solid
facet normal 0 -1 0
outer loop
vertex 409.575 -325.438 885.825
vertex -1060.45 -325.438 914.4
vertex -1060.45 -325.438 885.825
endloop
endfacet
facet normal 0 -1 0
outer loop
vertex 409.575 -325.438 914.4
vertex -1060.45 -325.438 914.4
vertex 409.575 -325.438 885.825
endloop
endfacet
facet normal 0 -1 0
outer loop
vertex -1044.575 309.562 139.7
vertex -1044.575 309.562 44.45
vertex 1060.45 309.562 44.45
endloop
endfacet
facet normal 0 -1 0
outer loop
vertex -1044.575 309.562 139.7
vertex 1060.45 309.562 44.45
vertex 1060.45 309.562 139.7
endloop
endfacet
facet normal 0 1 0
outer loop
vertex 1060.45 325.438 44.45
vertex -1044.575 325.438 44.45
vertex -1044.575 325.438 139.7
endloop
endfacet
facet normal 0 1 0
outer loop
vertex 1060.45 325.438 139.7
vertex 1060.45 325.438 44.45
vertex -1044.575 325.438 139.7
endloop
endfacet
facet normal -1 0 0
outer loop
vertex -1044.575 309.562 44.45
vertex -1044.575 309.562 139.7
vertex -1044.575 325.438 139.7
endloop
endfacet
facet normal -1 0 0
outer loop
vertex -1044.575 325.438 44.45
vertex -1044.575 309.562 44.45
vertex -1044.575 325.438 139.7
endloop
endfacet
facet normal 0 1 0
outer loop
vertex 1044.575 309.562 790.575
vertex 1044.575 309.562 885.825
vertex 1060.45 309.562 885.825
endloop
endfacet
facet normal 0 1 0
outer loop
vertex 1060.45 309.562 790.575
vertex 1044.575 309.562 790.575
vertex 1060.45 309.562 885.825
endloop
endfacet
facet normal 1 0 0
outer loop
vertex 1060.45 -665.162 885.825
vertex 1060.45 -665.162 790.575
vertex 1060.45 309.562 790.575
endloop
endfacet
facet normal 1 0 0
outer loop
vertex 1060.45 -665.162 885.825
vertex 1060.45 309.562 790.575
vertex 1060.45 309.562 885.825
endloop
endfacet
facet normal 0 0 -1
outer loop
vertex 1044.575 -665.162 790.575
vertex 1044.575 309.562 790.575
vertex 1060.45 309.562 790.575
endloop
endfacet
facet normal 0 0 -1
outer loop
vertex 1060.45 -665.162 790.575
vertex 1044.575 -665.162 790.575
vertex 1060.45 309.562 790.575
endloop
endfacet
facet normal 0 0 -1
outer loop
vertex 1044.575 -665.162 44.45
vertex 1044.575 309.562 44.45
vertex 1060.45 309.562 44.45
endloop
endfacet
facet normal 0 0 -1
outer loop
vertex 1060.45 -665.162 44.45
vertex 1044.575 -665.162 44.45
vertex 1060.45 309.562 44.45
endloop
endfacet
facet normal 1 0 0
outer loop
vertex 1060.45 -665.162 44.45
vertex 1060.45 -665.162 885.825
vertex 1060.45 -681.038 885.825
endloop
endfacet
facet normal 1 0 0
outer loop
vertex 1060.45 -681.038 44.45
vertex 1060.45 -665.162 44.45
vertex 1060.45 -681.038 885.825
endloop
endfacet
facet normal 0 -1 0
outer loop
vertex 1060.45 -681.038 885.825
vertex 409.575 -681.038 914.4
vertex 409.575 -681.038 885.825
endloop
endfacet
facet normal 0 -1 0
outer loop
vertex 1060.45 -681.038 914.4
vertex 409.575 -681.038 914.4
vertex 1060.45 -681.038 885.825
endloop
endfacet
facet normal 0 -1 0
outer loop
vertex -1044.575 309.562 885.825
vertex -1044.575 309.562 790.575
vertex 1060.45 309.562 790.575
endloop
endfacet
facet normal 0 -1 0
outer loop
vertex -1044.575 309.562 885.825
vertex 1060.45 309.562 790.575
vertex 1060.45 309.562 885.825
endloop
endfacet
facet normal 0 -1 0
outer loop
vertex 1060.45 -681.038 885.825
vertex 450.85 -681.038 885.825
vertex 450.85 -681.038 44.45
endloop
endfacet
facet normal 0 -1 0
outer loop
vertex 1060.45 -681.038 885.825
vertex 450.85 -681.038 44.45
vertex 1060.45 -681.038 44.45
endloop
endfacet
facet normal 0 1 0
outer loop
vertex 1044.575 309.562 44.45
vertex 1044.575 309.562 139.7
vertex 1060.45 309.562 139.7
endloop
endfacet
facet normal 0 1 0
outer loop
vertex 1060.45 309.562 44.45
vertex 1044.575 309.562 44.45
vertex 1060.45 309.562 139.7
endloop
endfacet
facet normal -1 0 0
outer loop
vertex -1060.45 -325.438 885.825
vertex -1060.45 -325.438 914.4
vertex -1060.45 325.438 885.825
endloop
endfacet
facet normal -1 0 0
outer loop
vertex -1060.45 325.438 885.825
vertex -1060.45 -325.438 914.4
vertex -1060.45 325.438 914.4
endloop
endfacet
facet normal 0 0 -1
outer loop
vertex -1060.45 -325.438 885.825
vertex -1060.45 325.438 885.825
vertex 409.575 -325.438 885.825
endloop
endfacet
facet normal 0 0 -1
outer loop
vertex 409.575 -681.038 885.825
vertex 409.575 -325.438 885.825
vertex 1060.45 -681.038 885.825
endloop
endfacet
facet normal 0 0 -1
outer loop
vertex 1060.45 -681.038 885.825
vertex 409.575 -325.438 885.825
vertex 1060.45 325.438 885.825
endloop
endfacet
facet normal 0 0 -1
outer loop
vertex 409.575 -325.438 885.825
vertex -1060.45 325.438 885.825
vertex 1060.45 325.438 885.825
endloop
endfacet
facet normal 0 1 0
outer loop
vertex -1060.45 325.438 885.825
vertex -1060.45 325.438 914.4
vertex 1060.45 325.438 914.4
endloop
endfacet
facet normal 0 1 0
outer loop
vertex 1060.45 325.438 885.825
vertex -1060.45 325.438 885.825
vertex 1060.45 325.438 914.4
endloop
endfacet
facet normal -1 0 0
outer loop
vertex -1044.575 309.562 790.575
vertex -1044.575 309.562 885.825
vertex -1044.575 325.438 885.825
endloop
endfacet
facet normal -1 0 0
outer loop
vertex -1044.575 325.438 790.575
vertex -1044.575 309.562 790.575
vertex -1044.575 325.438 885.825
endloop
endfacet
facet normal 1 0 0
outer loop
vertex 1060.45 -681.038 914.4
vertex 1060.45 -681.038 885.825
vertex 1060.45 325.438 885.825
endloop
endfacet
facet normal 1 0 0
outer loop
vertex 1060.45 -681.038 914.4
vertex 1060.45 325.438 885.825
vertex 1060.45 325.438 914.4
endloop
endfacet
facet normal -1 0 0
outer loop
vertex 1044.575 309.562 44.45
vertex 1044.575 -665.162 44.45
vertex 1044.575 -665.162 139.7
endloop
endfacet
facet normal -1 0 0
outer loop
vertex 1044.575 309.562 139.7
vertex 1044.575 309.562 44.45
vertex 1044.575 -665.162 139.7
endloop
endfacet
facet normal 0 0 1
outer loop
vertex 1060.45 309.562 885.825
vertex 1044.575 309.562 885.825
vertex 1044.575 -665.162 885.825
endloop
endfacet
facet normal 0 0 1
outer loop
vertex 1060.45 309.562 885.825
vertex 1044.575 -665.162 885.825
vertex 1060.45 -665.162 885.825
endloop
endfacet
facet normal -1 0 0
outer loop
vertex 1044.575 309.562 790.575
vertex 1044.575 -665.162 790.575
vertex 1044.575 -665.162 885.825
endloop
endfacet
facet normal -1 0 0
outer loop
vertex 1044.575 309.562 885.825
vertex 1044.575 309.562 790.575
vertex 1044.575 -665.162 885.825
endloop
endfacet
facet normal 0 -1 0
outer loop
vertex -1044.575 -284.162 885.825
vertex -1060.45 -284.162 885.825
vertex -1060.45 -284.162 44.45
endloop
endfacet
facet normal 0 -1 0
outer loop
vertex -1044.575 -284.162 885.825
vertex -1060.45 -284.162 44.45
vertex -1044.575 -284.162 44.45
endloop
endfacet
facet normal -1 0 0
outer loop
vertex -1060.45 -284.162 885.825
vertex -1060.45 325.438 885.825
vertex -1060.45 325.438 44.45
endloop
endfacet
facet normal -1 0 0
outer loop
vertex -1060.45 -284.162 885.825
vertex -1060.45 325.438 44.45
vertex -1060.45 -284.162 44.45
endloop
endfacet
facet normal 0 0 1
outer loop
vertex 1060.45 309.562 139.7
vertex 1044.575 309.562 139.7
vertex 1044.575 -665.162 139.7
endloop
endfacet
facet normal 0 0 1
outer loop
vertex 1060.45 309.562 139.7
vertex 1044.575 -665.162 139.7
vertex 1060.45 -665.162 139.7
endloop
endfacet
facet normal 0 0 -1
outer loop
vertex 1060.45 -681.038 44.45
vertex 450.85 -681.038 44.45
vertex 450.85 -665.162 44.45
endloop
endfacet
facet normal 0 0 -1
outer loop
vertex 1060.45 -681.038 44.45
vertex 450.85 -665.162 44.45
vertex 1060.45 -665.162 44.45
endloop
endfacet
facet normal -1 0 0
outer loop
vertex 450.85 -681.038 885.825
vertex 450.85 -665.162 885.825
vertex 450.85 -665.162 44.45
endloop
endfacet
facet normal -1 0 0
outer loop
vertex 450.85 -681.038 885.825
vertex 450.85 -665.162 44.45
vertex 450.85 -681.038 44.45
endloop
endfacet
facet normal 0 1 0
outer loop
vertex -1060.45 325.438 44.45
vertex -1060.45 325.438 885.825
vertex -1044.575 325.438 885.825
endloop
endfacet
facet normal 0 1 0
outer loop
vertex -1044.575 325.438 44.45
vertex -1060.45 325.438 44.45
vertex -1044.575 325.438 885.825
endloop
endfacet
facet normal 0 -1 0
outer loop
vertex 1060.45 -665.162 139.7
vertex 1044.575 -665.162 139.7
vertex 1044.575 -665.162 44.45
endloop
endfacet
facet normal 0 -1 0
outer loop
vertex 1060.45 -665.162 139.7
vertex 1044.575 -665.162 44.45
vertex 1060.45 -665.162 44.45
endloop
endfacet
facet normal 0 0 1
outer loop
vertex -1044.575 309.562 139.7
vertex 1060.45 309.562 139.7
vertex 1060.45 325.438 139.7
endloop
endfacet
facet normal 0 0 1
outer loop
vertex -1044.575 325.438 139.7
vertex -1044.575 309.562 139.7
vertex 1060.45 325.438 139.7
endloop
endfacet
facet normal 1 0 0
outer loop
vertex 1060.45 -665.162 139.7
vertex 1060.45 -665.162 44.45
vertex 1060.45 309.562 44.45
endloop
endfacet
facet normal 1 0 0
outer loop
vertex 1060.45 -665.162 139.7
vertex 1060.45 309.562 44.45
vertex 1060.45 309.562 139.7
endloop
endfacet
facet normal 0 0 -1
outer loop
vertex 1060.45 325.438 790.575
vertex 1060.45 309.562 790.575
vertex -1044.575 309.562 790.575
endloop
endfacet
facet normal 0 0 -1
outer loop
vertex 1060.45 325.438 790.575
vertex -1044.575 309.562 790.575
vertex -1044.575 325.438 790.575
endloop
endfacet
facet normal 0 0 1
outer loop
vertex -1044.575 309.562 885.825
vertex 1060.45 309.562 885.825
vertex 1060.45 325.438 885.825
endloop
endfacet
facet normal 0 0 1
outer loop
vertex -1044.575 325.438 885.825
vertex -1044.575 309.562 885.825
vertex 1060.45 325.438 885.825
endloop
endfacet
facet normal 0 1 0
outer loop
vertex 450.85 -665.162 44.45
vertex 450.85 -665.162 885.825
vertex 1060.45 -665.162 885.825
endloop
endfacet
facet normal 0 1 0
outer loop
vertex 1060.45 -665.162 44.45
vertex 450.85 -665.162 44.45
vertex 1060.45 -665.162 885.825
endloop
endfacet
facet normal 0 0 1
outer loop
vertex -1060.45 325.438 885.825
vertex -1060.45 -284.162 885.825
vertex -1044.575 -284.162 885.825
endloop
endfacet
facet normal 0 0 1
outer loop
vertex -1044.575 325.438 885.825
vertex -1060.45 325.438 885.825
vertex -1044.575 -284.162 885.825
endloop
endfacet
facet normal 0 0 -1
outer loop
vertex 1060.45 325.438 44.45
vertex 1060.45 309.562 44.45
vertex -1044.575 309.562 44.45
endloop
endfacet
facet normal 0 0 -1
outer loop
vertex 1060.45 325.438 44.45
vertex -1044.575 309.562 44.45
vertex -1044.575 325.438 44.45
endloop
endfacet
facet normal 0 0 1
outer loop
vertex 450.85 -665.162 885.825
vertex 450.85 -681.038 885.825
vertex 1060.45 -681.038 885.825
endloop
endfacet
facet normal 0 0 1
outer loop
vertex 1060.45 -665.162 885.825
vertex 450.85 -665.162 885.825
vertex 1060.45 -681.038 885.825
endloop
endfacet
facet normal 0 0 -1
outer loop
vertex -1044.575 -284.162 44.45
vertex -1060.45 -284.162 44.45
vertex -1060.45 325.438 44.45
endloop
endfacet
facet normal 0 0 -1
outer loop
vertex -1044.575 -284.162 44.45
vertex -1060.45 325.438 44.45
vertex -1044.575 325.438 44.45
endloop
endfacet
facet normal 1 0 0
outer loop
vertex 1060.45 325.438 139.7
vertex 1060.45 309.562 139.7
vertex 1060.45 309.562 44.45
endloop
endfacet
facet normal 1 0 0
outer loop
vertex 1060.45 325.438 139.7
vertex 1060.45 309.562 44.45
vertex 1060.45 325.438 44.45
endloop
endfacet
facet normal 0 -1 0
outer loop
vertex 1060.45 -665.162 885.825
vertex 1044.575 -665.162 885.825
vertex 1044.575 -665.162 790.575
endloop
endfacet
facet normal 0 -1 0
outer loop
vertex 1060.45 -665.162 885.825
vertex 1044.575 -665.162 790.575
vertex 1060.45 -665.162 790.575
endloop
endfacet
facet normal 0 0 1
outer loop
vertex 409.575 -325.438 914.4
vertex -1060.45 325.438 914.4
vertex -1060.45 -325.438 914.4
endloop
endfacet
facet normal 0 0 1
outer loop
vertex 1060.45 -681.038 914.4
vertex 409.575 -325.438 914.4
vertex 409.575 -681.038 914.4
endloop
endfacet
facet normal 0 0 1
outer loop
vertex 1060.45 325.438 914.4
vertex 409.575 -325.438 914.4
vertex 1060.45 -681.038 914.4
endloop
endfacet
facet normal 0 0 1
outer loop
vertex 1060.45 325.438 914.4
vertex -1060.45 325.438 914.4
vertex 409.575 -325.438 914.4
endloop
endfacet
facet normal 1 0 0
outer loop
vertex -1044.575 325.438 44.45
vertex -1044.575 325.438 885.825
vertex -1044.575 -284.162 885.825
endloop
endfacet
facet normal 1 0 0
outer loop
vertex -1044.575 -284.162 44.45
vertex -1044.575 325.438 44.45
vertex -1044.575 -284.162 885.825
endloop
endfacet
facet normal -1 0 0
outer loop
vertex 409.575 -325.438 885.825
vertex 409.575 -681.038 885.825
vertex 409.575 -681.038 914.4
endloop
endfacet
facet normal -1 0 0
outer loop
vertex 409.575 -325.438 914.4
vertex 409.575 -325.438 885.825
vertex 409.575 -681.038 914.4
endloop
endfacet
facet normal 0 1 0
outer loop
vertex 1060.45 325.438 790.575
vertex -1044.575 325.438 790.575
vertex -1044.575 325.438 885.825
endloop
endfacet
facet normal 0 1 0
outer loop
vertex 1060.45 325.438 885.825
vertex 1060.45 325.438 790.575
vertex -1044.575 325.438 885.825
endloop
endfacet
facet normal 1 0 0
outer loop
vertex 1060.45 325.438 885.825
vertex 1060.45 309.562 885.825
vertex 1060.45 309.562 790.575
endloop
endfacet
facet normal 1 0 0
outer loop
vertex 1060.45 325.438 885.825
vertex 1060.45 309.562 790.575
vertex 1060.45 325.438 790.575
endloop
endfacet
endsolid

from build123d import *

# Parameters (mm, degrees)
F1_W      = 2120.9
F1_H      = 650.875
F2_DEPTH  = 28.575
F3_W      = 650.875
F3_H      = 28.575
F4_DEPTH  = 355.6
F5_W      = 15.875
F5_H      = 609.6
F6_DEPTH  = 841.375
F7_W      = 609.6
F7_H      = 15.875
F8_DEPTH  = 841.375
F9_W      = 15.875
F9_H      = 95.25
F10_DEPTH = 2105.025
F11_W     = 15.875
F11_H     = 95.25
F12_DEPTH = 2105.025
F13_W     = 15.875
F13_H     = 95.25
F14_DEPTH = 974.725
F15_W     = 15.875
F15_H     = 95.25
F16_DEPTH = 974.725


with BuildPart() as f2:
    # F1 (on offset) → F2 (new body)
    with BuildSketch(Plane.XY.offset(914.4)):
        Rectangle(F1_W, F1_H)
    extrude(amount=-F2_DEPTH)

    # F3 (on face) → F4 (join)
    with BuildSketch(Plane.XZ.offset(325.4375)):
        with Locations((735.0125, 900.1125)):
            Rectangle(F3_W, F3_H)
    extrude(amount=F4_DEPTH)


with BuildPart() as f6:
    # F5 (on face) → F6 (new body)
    with BuildSketch(Plane(origin=(0, 0, 885.825), x_dir=(1, 0, 0), z_dir=(0, 0, -1))):
        with Locations((-1052.5125, -20.6375)):
            Rectangle(F5_W, F5_H)
    extrude(amount=F6_DEPTH)


with BuildPart() as f8:
    # F7 (on face) → F8 (new body)
    with BuildSketch(Plane(origin=(0, 0, 885.825), x_dir=(1, 0, 0), z_dir=(0, 0, -1))):
        with Locations((755.65, 673.1)):
            Rectangle(F7_W, F7_H)
    extrude(amount=F8_DEPTH)


with BuildPart() as f10:
    # F9 (on face) → F10 (new body)
    with BuildSketch(Plane.YZ.offset(-1044.575)):
        with Locations((317.5, 838.2)):
            Rectangle(F9_W, F9_H)
    extrude(amount=F10_DEPTH)


with BuildPart() as f12:
    # F11 (on face) → F12 (new body)
    with BuildSketch(Plane.YZ.offset(-1044.575)):
        with Locations((317.5, 92.075)):
            Rectangle(F11_W, F11_H)
    extrude(amount=F12_DEPTH)


with BuildPart() as f14:
    # F13 (on face) → F14 (new body)
    with BuildSketch(Plane.XZ.offset(-309.5625)):
        with Locations((1052.5125, 92.075)):
            Rectangle(F13_W, F13_H)
    extrude(amount=F14_DEPTH)


with BuildPart() as f16:
    # F15 (on face) → F16 (new body)
    with BuildSketch(Plane.XZ.offset(-309.5625)):
        with Locations((1052.5125, 838.2)):
            Rectangle(F15_W, F15_H)
    extrude(amount=F16_DEPTH)


solid = Compound([f2.part, f6.part, f8.part, f10.part, f12.part, f14.part, f16.part])
